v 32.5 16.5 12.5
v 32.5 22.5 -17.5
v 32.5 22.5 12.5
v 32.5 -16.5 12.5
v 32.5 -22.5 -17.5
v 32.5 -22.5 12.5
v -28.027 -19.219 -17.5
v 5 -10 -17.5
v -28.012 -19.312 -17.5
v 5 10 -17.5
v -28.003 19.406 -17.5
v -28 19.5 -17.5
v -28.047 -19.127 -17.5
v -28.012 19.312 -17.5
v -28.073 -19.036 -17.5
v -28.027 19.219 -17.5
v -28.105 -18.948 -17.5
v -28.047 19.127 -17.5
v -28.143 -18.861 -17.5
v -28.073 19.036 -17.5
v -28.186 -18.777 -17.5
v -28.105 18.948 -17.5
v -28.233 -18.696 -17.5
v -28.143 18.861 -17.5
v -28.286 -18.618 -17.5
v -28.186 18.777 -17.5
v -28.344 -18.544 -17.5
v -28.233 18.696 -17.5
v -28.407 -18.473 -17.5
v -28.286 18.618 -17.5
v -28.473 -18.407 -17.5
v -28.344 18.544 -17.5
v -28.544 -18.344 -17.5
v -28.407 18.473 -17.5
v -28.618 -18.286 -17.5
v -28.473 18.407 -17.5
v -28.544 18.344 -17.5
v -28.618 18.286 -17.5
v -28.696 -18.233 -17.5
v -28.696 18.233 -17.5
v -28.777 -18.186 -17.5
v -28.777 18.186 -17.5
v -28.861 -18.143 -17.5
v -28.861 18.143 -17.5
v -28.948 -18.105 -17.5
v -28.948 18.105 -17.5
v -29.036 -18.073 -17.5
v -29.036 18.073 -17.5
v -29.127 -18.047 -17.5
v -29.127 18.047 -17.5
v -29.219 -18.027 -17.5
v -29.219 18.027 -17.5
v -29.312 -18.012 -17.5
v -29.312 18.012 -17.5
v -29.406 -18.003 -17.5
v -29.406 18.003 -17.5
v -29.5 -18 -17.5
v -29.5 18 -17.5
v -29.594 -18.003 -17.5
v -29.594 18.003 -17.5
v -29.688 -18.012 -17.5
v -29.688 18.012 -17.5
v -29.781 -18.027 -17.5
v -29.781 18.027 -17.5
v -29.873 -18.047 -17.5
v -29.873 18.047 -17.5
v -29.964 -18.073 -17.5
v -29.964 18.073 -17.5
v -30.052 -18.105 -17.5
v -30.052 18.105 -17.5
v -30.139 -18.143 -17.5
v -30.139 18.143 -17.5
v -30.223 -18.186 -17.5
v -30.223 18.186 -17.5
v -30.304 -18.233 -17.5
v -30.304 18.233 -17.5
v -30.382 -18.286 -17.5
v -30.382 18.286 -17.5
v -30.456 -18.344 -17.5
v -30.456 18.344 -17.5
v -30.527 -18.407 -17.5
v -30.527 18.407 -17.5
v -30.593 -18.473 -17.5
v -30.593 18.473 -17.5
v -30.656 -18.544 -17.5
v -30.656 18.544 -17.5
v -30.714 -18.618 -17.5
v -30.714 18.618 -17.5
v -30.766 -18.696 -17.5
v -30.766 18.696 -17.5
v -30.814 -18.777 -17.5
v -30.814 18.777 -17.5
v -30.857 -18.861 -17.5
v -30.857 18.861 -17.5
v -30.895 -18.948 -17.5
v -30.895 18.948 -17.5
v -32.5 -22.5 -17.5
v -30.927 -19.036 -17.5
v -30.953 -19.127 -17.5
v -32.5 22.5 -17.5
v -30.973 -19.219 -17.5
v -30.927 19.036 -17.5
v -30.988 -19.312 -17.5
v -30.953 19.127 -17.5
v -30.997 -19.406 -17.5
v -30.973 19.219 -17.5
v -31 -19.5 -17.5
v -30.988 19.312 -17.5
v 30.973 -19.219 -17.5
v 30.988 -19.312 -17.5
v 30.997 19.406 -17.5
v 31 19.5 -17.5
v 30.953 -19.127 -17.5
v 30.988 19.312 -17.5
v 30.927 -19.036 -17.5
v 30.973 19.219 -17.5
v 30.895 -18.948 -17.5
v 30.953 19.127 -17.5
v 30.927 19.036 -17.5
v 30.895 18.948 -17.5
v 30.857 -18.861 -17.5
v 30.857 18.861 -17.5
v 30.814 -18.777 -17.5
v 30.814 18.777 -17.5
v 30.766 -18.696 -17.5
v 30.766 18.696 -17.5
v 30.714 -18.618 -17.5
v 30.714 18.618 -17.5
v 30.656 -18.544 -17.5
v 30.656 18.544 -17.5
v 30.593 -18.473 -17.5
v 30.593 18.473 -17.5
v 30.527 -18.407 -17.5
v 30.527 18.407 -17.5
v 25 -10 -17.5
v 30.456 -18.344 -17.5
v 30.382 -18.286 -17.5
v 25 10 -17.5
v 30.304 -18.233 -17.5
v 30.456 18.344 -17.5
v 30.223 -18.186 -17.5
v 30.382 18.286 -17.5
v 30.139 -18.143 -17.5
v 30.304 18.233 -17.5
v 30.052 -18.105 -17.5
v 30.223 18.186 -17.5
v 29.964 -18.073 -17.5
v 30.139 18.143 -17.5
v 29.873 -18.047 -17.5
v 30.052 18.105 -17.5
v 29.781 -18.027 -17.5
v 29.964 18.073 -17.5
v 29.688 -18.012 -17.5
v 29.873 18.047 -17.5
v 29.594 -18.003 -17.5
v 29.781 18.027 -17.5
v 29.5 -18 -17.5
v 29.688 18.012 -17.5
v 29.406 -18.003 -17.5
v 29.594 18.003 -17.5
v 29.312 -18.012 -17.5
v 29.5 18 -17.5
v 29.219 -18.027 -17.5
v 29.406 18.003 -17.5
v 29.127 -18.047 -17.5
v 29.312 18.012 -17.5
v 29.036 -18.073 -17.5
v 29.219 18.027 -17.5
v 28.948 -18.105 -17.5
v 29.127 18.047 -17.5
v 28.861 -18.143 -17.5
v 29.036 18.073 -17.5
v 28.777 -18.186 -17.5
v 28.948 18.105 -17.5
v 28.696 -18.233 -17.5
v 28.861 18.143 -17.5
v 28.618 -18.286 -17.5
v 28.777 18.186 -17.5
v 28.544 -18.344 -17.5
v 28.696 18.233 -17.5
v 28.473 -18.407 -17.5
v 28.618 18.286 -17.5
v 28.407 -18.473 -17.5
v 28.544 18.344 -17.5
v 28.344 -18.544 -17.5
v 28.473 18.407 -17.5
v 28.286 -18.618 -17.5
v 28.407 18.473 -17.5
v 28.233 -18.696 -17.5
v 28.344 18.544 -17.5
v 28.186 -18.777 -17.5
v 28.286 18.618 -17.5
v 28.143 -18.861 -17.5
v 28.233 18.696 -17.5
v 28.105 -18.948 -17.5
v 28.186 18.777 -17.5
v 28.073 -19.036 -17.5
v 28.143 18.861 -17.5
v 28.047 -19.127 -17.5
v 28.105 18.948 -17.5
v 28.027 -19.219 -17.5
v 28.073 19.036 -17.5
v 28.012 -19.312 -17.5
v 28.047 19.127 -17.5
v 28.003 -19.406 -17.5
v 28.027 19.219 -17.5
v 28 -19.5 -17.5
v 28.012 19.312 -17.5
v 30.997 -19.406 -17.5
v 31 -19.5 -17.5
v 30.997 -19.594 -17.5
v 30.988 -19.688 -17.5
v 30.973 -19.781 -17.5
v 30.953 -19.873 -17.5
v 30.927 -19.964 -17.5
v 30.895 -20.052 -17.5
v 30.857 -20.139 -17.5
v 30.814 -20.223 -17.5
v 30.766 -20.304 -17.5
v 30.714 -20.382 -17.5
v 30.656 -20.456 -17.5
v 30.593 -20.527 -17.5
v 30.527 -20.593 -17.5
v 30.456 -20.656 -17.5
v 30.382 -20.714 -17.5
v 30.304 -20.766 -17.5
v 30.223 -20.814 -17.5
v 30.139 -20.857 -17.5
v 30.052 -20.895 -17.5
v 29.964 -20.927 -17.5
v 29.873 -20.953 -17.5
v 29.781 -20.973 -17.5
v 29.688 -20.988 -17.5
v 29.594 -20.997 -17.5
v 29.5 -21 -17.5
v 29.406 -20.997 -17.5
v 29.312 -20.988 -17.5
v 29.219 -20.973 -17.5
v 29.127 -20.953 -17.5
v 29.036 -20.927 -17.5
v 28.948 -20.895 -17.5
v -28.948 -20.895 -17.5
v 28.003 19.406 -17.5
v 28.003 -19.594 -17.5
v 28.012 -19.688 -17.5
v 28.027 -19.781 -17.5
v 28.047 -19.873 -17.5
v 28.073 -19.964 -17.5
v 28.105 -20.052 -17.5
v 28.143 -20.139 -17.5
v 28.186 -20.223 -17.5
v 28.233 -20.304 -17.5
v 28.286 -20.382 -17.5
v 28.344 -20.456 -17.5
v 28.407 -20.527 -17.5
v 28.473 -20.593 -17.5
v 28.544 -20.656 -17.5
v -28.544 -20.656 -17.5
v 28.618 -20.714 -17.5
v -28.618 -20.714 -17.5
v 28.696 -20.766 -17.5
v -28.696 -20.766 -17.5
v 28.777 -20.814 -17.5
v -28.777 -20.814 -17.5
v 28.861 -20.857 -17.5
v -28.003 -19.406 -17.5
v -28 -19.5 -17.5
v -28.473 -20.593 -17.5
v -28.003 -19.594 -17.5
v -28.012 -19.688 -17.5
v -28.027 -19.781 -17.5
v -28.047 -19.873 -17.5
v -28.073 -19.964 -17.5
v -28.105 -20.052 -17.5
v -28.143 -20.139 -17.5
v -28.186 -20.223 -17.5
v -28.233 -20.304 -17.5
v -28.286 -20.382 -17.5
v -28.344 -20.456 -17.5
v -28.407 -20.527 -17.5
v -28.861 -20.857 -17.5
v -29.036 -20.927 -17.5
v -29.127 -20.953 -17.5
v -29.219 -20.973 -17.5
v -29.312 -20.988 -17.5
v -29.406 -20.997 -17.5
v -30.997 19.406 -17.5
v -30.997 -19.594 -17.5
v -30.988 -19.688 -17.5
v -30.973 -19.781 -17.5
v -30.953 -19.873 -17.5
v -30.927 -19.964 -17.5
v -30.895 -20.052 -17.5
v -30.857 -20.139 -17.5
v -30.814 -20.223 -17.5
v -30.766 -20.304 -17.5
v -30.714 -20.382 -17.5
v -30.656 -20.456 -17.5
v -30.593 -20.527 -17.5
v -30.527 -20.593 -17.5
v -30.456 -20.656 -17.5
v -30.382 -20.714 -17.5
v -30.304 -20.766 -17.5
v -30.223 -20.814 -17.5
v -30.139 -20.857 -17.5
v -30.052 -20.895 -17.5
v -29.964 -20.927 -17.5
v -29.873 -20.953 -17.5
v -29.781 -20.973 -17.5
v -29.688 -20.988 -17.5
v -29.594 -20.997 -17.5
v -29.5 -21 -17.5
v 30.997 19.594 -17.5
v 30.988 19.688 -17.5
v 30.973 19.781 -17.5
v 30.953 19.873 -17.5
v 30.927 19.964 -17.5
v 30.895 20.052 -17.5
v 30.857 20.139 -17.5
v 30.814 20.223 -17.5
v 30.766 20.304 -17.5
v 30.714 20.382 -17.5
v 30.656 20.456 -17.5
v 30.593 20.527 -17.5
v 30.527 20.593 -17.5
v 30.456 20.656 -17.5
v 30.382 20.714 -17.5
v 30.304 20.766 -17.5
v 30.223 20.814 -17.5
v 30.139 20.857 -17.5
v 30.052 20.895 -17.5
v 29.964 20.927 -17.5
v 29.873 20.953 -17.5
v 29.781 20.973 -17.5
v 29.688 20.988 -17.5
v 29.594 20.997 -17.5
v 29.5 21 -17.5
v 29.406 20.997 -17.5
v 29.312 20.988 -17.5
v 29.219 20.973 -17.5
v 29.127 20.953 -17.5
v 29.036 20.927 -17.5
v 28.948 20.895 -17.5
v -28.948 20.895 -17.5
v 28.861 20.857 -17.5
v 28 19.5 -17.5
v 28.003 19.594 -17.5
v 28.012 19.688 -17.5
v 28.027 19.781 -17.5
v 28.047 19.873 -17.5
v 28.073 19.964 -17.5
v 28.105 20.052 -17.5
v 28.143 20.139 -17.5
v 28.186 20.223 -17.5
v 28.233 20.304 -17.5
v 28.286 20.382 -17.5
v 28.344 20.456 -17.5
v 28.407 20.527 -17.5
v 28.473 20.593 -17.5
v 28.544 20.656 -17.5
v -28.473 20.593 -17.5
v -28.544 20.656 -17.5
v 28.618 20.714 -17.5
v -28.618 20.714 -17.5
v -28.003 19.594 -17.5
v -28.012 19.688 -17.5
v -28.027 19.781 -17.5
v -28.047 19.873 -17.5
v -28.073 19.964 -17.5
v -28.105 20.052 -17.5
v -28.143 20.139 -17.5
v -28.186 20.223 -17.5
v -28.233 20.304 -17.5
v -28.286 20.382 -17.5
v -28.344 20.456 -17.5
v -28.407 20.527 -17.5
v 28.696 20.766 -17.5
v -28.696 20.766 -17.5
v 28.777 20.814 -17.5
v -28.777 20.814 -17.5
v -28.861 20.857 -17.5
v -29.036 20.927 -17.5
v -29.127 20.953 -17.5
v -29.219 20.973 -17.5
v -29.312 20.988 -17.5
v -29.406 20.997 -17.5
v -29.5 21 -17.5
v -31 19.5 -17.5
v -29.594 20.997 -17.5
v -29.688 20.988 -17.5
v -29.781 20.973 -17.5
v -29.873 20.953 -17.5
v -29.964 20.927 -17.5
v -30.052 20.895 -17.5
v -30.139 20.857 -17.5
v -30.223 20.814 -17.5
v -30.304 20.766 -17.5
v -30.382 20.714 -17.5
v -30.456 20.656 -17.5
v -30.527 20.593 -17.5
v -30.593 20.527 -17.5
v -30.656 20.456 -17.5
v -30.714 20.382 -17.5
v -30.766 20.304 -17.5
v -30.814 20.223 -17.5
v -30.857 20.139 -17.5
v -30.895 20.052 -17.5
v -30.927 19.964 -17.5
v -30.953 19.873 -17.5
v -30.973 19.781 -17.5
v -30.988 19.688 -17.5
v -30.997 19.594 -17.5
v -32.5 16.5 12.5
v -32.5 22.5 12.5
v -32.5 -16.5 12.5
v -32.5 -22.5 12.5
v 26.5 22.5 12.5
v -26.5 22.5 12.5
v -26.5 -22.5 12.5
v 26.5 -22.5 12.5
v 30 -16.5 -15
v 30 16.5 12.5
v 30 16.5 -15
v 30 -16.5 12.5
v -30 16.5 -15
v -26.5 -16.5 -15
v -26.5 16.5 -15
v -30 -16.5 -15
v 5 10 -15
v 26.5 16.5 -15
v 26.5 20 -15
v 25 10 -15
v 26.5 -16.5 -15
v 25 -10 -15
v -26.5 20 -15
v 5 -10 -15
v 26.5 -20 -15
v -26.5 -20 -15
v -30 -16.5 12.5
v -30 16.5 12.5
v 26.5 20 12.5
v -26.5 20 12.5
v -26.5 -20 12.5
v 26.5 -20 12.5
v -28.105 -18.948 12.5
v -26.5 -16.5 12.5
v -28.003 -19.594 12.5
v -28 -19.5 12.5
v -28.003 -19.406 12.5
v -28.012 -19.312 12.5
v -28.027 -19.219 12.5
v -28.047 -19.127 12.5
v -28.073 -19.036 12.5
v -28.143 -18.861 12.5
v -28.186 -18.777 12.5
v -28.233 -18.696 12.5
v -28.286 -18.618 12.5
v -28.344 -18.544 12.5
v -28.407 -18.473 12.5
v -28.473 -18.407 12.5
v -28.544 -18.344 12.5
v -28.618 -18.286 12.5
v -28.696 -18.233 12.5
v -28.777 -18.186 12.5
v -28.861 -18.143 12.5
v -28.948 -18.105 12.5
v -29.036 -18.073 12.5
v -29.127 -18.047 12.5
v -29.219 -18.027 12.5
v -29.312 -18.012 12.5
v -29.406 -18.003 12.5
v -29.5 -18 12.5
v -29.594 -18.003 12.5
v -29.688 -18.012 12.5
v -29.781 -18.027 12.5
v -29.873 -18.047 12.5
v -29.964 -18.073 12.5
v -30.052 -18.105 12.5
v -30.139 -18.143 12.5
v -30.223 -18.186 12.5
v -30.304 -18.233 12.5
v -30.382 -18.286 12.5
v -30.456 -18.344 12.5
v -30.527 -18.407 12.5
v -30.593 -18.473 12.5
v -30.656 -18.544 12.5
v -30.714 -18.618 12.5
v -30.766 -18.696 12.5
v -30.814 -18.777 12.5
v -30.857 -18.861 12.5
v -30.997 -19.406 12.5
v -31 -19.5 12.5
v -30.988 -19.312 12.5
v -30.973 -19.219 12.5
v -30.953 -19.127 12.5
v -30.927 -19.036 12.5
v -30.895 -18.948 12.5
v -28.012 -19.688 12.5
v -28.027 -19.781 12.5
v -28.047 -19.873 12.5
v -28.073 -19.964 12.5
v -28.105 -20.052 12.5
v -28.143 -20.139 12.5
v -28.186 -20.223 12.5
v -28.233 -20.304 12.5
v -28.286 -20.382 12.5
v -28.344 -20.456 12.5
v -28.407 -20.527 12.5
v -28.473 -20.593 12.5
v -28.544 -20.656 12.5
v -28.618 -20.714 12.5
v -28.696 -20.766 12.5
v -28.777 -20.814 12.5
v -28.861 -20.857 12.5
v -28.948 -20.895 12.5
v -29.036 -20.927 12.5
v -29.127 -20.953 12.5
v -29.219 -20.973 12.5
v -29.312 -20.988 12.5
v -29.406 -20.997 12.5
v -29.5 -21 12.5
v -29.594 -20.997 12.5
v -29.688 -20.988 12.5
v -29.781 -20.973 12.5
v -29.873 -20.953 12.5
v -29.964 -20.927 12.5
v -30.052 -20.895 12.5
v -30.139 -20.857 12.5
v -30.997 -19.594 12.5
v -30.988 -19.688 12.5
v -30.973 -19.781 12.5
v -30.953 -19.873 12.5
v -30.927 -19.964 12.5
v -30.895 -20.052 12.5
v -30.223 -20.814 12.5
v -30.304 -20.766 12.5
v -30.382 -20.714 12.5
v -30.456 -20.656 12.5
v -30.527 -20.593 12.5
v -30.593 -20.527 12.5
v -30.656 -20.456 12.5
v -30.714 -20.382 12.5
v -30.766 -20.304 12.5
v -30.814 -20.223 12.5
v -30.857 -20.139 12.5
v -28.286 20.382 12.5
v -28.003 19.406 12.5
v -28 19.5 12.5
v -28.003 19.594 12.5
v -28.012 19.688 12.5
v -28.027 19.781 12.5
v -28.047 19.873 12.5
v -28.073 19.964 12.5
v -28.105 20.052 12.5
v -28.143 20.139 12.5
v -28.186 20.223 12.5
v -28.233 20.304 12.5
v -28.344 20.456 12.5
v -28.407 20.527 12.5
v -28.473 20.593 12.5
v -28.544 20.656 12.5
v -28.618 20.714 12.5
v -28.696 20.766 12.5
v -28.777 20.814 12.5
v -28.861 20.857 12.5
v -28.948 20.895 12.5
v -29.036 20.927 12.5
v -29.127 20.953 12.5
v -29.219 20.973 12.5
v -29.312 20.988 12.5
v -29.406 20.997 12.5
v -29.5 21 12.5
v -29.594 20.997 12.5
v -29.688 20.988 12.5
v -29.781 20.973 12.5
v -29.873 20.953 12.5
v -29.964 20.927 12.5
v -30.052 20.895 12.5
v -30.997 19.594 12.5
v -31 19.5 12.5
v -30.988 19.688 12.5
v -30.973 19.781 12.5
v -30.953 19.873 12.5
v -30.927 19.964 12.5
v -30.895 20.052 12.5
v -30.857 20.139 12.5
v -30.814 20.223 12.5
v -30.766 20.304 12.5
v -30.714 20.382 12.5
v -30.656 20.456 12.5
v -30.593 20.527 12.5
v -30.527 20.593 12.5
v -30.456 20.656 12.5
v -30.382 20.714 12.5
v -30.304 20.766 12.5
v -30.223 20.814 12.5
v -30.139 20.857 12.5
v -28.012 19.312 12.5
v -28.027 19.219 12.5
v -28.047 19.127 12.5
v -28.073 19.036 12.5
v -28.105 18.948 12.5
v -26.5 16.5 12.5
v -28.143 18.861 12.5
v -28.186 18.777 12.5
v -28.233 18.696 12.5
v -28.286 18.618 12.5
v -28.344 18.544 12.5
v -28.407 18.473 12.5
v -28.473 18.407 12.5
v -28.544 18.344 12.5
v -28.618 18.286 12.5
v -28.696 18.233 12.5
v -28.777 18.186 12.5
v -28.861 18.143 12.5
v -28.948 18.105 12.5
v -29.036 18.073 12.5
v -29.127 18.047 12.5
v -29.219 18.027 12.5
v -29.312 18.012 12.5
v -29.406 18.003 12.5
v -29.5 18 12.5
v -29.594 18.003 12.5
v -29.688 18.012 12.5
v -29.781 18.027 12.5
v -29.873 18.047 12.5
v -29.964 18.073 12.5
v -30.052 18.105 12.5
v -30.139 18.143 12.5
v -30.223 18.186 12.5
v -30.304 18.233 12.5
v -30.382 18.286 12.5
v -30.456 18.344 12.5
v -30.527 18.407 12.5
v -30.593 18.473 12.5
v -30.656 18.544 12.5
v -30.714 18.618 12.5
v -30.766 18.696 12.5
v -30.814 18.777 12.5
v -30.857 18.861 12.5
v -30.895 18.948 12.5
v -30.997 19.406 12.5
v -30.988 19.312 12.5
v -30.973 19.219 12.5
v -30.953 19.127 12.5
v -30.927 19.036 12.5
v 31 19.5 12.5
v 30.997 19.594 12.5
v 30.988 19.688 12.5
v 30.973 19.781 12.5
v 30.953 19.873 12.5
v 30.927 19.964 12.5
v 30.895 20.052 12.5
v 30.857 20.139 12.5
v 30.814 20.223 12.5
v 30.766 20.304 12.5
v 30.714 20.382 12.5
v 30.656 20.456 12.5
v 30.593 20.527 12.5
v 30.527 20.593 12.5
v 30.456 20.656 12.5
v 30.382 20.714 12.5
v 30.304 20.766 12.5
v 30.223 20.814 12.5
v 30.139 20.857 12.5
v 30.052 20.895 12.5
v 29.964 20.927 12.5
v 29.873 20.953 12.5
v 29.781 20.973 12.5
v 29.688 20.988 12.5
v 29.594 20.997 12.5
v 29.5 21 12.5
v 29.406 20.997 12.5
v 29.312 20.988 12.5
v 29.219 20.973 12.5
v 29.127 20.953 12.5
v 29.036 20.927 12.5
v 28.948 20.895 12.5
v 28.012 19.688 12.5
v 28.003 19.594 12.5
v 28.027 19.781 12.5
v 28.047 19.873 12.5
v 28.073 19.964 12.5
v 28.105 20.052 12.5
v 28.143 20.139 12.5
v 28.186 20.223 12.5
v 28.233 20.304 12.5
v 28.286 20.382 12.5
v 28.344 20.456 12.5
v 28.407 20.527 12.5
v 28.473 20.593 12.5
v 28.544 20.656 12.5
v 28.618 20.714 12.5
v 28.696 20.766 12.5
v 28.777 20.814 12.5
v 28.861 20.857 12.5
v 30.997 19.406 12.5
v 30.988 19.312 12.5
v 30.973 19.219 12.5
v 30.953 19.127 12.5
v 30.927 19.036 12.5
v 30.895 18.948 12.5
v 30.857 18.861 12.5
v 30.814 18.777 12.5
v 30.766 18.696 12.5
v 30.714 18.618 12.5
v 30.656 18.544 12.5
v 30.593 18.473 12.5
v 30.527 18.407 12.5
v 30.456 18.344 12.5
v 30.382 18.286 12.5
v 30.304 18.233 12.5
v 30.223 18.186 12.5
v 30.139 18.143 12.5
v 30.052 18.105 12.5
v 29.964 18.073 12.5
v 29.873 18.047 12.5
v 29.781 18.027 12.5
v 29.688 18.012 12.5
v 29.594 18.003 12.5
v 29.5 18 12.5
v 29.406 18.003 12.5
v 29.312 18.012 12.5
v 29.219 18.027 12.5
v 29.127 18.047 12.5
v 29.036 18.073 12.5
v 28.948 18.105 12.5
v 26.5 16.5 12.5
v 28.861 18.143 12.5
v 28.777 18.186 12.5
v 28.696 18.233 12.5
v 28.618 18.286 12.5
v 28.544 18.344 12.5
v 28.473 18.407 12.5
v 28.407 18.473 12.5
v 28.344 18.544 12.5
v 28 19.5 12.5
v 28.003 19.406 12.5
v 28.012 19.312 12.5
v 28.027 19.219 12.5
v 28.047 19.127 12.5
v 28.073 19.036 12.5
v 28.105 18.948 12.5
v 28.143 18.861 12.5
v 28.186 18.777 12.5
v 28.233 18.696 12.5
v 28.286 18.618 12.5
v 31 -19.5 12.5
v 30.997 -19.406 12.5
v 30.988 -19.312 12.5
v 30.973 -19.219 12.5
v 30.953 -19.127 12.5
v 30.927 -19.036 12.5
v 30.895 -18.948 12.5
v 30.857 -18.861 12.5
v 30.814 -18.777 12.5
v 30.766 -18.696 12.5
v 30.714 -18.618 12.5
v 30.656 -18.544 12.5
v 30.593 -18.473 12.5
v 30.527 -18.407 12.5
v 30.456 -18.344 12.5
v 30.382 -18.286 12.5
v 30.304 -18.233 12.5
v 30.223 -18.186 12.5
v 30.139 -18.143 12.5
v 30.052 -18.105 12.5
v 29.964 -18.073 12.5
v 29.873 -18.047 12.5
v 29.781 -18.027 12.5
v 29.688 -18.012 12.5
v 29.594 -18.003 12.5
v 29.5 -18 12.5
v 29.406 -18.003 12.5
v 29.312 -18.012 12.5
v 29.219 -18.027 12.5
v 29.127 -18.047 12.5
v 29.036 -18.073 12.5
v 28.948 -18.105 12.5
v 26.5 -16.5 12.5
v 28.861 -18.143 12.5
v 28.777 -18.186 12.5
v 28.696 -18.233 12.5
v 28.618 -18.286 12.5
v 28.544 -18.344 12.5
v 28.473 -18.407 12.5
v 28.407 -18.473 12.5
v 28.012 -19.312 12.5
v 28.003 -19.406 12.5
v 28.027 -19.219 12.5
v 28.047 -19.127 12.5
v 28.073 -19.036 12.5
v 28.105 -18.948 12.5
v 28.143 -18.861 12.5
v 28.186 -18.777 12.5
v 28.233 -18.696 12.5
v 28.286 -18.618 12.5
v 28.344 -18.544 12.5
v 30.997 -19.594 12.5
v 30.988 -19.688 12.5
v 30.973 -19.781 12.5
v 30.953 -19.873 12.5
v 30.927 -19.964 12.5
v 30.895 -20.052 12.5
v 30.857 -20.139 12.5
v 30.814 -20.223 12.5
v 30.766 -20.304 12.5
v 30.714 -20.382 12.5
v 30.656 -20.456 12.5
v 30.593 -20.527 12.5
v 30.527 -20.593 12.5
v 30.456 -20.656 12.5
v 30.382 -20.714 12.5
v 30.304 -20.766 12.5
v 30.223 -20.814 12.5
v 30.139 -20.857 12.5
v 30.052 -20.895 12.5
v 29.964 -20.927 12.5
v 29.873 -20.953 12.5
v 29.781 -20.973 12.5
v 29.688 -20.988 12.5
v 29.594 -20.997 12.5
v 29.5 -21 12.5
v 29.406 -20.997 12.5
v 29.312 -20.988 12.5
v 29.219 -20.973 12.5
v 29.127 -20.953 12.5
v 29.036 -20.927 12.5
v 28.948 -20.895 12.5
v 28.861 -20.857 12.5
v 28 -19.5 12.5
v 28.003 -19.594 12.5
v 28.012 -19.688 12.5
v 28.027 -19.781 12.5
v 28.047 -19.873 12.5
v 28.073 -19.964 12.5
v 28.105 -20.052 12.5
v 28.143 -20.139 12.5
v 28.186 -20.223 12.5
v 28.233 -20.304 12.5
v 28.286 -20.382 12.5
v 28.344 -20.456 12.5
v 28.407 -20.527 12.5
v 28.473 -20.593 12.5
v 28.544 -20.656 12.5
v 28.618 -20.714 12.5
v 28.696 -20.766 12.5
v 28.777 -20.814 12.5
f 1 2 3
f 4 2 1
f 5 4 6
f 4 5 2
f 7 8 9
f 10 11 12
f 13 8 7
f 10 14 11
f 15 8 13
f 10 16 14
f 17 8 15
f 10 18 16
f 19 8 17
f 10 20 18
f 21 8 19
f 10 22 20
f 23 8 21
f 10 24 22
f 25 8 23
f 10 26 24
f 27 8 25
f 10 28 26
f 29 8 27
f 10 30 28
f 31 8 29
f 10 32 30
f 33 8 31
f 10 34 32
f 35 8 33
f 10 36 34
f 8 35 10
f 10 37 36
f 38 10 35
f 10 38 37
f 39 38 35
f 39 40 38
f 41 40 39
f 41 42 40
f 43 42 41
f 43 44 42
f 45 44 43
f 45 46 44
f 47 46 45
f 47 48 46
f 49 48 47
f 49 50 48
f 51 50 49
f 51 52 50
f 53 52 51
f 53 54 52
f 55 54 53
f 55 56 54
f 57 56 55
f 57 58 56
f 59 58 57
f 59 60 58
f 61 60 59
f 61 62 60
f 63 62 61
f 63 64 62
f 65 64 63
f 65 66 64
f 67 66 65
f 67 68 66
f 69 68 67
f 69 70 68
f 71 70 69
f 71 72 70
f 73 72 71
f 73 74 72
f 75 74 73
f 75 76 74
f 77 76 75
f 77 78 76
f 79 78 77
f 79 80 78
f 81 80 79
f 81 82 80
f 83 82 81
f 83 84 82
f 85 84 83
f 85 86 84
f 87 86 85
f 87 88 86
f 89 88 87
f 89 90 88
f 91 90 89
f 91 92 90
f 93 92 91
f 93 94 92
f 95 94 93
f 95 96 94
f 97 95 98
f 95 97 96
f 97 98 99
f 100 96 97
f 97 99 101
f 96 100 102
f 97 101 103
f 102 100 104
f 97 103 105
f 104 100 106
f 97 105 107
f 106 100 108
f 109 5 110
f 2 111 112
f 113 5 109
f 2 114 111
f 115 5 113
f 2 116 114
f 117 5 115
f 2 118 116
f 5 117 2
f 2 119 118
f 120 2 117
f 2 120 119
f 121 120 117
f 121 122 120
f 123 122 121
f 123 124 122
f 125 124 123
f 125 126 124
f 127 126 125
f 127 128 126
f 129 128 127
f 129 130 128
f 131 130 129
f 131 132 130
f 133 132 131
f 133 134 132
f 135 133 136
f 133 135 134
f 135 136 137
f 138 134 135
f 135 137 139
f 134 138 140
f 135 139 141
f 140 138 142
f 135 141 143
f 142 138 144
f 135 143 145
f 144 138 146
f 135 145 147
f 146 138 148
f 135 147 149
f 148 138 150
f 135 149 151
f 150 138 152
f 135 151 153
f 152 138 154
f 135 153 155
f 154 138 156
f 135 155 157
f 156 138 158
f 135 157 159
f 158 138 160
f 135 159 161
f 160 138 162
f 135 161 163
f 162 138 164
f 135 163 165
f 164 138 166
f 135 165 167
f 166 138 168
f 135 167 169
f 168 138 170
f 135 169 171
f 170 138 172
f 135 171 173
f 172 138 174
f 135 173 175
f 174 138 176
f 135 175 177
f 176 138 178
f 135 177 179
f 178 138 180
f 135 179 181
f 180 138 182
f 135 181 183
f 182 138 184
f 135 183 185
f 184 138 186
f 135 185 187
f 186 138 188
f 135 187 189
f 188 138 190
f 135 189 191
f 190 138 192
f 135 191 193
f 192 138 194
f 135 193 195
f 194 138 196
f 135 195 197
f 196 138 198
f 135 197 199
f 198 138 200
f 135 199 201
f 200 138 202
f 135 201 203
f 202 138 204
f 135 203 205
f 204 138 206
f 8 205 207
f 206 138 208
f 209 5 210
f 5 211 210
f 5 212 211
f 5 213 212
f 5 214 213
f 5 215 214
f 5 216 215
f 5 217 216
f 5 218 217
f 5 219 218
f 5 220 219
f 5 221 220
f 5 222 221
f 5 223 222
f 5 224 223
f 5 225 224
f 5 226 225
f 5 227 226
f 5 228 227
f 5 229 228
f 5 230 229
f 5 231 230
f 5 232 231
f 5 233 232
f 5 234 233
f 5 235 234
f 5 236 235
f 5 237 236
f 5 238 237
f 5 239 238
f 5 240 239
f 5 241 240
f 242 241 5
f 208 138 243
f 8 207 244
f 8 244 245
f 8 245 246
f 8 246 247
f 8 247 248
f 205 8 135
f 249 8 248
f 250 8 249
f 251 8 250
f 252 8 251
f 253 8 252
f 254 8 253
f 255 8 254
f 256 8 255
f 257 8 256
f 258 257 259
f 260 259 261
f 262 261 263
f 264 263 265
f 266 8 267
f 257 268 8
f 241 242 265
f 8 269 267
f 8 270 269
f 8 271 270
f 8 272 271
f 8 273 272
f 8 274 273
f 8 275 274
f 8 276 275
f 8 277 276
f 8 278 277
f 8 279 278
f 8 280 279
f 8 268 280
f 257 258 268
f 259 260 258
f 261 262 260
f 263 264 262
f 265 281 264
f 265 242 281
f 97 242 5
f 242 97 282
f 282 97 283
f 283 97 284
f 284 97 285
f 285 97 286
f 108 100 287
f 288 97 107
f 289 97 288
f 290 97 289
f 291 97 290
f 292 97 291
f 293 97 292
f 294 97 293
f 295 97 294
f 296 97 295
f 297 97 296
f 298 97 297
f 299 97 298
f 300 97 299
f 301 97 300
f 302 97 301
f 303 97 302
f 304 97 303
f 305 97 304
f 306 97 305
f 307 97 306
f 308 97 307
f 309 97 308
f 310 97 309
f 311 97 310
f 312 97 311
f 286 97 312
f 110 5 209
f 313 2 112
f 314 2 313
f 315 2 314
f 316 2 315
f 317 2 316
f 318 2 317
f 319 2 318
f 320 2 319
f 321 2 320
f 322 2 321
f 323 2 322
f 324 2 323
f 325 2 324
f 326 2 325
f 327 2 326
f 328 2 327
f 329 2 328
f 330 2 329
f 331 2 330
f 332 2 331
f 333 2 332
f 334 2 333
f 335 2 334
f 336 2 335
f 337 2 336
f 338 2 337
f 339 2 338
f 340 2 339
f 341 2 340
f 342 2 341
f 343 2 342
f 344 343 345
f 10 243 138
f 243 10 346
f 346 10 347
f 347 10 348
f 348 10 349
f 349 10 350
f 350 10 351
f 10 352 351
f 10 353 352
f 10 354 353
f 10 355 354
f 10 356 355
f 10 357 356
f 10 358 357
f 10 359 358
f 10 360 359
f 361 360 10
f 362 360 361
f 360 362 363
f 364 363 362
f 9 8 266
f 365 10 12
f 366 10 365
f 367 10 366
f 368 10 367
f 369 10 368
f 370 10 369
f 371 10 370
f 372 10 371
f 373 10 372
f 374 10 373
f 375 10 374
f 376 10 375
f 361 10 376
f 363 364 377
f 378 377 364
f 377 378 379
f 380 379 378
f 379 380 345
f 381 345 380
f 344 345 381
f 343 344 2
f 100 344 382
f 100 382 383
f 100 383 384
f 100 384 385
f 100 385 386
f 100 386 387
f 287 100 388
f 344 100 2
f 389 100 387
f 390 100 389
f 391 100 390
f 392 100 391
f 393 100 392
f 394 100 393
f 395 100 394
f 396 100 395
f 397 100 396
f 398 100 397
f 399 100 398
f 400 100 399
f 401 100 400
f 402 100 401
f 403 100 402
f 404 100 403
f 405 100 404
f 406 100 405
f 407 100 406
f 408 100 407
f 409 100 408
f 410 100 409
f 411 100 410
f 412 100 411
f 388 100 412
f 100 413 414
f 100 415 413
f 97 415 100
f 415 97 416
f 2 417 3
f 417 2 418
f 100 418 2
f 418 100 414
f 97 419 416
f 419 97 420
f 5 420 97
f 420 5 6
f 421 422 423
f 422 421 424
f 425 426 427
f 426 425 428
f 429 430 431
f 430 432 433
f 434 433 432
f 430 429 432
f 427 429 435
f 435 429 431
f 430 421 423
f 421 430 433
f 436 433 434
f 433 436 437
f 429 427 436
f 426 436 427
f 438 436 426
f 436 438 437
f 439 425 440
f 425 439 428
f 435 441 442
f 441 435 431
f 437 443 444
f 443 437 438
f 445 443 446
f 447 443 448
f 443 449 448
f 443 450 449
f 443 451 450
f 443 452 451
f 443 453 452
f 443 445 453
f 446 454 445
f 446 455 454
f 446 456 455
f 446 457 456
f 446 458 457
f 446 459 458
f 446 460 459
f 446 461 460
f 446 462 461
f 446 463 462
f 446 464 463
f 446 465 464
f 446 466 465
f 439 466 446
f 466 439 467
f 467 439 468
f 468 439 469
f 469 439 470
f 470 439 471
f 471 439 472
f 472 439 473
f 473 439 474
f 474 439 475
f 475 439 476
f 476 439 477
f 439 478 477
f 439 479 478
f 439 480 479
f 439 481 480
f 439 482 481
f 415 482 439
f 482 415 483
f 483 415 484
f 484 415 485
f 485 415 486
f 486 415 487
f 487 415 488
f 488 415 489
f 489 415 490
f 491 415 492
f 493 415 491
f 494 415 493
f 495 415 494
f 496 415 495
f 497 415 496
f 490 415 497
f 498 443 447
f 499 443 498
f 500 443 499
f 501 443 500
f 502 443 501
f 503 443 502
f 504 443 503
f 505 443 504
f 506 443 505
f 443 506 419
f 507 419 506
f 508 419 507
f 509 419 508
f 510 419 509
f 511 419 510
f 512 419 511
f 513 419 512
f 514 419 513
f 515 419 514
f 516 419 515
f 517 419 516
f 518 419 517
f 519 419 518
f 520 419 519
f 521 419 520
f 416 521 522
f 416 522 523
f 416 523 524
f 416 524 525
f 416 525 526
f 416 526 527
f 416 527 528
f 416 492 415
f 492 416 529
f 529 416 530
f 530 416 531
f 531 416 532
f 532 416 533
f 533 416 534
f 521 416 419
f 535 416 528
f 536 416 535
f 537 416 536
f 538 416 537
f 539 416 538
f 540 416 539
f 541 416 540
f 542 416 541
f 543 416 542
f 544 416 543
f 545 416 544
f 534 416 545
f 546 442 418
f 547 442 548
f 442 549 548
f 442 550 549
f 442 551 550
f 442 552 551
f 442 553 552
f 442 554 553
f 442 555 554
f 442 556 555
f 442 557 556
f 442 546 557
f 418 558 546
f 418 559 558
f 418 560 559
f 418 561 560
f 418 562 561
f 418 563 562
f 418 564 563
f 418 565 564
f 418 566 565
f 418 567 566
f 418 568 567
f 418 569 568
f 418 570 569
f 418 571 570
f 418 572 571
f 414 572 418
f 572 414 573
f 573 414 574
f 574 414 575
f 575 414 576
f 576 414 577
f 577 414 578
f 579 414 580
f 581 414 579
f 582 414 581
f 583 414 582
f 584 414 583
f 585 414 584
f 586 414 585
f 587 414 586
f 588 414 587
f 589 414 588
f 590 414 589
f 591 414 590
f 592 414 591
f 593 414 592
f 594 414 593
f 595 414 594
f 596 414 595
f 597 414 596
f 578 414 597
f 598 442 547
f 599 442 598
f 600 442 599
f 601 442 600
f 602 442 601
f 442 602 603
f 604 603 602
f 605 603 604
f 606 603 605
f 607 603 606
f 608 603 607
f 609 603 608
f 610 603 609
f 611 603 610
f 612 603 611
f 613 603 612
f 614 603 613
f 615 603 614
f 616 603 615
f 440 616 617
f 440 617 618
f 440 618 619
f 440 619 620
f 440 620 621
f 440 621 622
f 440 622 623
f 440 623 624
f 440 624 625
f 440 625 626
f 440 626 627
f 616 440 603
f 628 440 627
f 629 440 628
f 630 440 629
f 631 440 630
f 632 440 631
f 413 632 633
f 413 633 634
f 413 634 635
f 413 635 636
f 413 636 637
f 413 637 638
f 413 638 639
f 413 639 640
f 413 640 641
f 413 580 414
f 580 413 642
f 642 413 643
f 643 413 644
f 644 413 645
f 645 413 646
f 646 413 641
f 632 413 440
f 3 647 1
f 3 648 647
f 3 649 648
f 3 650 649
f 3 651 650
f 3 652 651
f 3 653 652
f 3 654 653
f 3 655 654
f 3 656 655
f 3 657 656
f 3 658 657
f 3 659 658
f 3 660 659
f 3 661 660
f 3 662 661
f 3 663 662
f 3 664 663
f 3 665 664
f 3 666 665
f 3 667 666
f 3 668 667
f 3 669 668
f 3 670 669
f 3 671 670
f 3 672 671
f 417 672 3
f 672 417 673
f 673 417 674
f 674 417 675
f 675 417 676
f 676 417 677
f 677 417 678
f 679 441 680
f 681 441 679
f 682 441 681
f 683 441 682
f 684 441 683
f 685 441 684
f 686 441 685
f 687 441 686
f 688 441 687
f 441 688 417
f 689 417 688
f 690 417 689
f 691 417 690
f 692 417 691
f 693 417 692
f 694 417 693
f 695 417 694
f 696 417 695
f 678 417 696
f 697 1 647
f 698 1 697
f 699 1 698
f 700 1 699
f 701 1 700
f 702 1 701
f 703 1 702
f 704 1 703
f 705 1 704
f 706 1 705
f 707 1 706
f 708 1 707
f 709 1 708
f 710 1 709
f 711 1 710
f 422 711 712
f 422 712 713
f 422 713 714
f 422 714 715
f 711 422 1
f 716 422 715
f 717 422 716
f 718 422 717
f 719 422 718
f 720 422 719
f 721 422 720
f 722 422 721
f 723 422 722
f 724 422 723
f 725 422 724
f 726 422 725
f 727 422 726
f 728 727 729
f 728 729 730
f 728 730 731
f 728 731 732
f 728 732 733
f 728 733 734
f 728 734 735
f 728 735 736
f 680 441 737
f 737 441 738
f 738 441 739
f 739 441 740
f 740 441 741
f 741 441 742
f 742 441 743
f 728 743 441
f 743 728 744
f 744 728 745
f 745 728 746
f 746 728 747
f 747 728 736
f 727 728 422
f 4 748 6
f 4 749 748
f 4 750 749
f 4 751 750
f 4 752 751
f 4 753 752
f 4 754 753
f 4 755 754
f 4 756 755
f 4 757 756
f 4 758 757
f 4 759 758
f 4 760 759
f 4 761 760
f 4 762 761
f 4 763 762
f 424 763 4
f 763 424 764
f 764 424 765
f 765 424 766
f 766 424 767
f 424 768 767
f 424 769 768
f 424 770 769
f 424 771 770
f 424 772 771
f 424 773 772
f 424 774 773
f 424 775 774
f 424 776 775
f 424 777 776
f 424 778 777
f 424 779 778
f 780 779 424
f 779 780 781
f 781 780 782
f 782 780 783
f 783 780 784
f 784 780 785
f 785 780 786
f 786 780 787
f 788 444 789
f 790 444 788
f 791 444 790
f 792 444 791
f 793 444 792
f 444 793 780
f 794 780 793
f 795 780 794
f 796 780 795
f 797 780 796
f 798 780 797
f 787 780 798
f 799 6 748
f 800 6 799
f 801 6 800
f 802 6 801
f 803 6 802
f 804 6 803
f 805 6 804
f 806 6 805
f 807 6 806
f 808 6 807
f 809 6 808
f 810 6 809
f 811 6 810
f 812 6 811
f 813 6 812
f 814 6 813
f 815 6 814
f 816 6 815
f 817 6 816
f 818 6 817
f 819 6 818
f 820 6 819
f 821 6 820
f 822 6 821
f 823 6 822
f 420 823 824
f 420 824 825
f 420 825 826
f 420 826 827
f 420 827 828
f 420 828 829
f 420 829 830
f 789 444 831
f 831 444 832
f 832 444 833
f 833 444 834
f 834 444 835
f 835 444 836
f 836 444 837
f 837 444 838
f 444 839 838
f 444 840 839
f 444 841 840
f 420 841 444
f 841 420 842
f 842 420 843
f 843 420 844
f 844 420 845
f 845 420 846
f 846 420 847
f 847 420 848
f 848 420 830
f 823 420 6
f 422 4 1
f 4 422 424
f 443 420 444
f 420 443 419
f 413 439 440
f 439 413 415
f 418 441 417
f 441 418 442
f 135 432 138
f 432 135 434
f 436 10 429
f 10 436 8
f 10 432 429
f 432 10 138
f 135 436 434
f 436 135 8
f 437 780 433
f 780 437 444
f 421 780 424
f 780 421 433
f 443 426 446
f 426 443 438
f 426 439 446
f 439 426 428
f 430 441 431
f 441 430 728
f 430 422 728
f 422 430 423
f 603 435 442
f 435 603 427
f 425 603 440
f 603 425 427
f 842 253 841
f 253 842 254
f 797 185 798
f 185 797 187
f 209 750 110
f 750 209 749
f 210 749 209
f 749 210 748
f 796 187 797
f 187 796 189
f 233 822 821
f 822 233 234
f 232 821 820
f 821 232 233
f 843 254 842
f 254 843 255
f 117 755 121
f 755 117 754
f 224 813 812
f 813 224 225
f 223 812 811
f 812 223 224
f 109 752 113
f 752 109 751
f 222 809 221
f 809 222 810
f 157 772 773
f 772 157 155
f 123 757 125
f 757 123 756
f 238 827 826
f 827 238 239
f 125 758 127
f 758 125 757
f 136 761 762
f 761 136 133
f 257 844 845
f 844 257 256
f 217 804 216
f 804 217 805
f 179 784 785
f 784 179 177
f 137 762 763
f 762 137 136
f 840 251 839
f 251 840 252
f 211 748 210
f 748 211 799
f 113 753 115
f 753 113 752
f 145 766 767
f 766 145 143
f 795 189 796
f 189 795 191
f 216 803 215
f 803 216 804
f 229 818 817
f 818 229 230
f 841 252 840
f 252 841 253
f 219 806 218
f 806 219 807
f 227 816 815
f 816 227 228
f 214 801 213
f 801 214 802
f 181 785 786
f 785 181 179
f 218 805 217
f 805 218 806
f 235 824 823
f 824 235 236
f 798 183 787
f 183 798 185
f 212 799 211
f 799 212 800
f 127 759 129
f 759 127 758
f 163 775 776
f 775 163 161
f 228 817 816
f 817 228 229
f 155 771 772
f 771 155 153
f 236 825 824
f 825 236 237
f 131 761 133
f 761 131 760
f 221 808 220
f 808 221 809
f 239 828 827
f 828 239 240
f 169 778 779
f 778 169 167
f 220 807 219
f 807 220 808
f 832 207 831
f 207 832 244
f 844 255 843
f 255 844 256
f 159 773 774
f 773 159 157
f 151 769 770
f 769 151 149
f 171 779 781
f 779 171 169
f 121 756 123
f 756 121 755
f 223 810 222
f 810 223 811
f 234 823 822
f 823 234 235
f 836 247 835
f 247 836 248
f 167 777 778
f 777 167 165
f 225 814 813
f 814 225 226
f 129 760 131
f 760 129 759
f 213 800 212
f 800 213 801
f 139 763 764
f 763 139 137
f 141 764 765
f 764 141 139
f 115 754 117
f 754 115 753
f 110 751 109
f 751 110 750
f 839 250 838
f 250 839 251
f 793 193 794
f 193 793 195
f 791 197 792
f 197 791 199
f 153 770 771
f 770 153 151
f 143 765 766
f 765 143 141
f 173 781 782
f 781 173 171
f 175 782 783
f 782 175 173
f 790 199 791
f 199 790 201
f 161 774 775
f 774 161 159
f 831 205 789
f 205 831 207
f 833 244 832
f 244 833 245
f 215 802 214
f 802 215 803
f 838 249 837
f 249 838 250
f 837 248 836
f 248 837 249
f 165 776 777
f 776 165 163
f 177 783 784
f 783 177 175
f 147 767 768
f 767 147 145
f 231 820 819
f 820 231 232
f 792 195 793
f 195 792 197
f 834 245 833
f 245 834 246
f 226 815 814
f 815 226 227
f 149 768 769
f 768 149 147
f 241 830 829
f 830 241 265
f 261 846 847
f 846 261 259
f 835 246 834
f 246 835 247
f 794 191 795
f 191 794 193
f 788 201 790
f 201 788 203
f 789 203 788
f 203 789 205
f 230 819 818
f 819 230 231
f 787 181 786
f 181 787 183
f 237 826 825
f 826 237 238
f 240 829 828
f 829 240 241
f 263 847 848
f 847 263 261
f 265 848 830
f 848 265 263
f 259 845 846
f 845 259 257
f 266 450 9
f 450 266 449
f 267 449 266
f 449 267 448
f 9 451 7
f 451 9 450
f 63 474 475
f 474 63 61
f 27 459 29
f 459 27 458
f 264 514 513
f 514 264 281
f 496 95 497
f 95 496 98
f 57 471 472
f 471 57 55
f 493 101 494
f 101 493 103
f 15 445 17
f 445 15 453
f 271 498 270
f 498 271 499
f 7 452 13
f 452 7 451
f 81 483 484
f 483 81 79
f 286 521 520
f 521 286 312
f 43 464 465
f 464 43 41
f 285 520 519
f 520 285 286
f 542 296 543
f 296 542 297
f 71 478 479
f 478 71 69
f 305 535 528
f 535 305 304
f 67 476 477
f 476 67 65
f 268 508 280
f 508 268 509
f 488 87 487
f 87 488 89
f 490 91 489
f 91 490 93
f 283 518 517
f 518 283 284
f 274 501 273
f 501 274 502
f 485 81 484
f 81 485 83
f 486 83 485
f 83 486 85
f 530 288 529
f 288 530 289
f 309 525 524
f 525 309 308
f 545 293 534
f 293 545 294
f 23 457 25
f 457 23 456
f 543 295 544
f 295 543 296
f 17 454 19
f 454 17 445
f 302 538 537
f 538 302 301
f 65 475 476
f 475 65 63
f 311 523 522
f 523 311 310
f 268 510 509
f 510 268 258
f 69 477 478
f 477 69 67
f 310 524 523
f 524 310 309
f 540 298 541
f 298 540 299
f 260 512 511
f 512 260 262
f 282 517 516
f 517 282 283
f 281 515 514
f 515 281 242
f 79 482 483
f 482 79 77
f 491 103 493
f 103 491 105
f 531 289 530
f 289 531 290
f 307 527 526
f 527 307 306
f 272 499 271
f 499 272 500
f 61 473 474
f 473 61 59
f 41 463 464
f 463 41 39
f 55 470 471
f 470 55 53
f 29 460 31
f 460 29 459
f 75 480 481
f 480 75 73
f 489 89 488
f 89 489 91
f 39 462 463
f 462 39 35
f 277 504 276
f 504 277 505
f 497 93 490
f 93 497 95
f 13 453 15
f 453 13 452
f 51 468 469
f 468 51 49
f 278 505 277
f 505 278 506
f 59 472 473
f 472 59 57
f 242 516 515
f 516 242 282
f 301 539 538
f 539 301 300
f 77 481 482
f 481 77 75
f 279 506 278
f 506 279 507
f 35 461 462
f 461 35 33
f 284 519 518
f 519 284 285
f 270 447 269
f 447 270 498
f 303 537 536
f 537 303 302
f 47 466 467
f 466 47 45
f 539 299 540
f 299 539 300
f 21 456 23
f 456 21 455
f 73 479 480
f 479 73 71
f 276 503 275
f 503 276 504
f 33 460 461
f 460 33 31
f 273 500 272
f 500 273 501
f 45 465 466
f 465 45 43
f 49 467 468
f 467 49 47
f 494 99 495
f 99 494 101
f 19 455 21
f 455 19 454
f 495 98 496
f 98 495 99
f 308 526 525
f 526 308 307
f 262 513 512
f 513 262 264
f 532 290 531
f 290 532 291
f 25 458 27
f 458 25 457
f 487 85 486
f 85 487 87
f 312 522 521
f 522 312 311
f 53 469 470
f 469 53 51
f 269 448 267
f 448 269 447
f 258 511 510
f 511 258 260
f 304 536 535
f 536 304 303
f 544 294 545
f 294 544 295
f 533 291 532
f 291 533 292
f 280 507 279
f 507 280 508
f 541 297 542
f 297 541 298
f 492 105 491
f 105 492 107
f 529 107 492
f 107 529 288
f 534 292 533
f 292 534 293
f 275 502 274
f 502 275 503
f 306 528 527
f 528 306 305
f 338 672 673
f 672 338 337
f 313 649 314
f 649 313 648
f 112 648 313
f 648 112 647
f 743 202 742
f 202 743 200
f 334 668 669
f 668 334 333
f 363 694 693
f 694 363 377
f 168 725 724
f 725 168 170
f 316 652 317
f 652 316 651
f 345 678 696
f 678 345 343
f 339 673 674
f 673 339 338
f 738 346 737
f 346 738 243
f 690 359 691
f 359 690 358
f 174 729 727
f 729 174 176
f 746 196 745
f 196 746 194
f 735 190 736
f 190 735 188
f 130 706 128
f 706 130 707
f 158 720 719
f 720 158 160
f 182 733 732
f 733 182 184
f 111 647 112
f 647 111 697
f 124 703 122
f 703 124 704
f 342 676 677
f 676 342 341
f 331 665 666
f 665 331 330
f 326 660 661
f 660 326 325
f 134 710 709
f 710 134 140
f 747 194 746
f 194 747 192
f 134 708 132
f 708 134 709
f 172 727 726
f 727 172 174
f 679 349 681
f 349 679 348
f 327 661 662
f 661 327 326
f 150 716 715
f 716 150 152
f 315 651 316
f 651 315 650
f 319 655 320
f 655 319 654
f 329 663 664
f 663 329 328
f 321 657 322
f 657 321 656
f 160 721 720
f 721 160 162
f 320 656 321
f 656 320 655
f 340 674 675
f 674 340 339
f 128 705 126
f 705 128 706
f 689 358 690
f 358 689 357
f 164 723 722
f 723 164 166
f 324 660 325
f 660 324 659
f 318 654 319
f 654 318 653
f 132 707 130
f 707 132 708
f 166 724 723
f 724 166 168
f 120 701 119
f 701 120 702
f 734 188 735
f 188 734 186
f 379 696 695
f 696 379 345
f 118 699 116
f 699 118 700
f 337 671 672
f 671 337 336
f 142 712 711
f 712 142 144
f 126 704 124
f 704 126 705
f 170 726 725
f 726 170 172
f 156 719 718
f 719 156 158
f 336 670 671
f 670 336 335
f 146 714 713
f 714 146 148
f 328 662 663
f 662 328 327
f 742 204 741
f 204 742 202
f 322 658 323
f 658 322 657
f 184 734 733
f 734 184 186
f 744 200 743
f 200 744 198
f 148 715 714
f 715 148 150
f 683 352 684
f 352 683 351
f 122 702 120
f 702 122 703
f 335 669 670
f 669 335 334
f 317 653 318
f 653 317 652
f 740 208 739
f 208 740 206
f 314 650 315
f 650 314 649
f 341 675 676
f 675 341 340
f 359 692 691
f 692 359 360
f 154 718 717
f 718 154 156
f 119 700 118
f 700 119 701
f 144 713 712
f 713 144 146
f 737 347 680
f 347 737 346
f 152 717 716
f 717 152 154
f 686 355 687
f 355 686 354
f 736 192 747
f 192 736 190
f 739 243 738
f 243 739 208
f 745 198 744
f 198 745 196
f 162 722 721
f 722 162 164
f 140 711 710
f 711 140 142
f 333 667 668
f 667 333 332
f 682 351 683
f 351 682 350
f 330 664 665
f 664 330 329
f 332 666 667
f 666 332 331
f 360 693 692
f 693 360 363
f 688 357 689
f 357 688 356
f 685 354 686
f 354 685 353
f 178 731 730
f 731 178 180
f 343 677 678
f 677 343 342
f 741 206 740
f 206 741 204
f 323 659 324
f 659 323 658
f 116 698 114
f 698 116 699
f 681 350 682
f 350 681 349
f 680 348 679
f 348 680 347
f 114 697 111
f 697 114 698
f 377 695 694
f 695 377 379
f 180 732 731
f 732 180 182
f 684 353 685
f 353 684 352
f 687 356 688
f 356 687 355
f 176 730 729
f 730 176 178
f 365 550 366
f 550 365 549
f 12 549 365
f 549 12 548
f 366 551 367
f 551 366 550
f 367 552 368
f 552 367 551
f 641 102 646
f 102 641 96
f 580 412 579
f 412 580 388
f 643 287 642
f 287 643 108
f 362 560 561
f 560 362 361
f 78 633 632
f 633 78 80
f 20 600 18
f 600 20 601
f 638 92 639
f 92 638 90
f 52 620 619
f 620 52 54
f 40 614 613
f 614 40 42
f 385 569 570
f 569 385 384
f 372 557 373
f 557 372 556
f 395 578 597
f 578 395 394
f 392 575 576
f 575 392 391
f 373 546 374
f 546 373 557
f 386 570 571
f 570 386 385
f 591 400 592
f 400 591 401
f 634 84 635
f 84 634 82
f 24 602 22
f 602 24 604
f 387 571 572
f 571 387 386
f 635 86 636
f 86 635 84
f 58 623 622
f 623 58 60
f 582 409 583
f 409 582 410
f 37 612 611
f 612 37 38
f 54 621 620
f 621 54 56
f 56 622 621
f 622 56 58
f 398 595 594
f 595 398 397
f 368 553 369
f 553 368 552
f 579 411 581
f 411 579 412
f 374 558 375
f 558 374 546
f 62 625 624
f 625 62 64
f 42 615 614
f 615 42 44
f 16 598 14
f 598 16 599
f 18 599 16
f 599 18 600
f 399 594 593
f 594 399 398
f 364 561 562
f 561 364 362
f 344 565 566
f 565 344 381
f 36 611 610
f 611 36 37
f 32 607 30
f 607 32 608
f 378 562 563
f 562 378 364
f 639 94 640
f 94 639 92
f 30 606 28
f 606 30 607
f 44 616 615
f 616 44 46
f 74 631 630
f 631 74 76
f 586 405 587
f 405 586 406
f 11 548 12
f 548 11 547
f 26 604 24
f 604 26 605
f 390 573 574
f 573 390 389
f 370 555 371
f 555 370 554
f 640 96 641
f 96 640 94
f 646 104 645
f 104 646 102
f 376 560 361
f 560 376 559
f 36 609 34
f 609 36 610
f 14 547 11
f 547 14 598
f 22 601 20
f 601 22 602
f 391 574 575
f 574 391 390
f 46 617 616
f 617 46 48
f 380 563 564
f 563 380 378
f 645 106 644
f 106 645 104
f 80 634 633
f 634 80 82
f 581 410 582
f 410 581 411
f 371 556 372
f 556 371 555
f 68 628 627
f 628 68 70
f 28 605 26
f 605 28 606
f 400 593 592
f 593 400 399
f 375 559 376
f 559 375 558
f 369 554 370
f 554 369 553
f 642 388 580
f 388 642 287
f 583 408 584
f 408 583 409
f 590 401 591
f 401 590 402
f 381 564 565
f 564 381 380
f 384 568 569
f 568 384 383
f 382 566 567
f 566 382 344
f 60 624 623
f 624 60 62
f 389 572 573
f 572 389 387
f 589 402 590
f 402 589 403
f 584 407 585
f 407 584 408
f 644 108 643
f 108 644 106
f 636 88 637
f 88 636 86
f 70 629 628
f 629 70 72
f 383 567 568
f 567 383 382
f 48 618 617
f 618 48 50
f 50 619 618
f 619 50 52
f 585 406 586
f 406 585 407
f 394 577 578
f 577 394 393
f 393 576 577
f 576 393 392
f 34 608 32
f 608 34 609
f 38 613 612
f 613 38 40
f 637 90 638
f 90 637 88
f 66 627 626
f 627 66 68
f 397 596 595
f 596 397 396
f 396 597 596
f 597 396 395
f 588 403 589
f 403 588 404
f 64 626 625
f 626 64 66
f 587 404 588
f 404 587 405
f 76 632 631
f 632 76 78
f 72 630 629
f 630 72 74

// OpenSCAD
scale([10,10,10]){
    
    //TUBE ORIGINE
    if(false){
        translate([0,0,2])
        difference(){
            cylinder(h=1.5,d=1.5,center=false,$fn=100);
            cylinder(h=20,d=1.2,center=true,$fn=100);
        }

        difference(){
            cylinder(h=2,d=1.5,$fn=100);
            cylinder(h=20,d=0.5,$fn=100);
            cylinder(h=1.8*2,d=1,center=true,$fn=100);
        }
    }
    //TUBE 2.0
    if(false){
        translate([0,0,3])
        difference(){
            union(){
                translate([0,0,2])
                difference(){
                    cylinder(h=1.5,d=1.5,center=false,$fn=100);
                    cylinder(h=20,d=1.2,center=true,$fn=100);
                }

                difference(){
                    cylinder(h=2,d=1.5,$fn=100);
                    cylinder(h=20,d=0.5,$fn=100);
                    cylinder(h=1.8*2,d=1,center=true,$fn=100);
                }
                translate([0,0,1.2])
                difference(){
                    cylinder(h=2.5,d=2,$fn=100);
                    translate([0,0,-1])
                    cylinder(h=5,d=1.5,$fn=100);
                }
            }
            rotate_extrude($fn=200)
            polygon( points=[[0.73,0],[0.75,1.1],[15,1],[15,0]]);
        }
    }
    //CARRE POUR PTFE
    if(false){
        translate([0,0,10])
        difference(){
            union(){
                difference(){
                    translate([0,0,-0.25])
                    cube([2,2,2.5],center=true);
                    cube([1.7,1.7,5],center=true);
                }
                translate([0,0,0.1])
                difference(){
                    cube([2.3,2.3,2.1],center=true);
                    cube([2,2,5],center=true);                
                }
                cube([2,2,0.5],center=true);
                
            }
            ////////////////
            union(){
                cylinder(h=20,d=0.52,$fn=100,center=true);
                translate([0,0,-10])
                cylinder(h=20,d=0.7,$fn=100,center=true);
            }
            translate([0.5,0.5,0])
            union(){
                cylinder(h=20,d=0.52,$fn=100,center=true);
                translate([0,0,-10])
                cylinder(h=20,d=0.7,$fn=100,center=true);
            }
            translate([-0.5,0.5,0])
            union(){
                cylinder(h=20,d=0.52,$fn=100,center=true);
                translate([0,0,-10])
                cylinder(h=20,d=0.7,$fn=100,center=true);
            }
            translate([0.5,-0.5,0])
            union(){
                cylinder(h=20,d=0.52,$fn=100,center=true);
                translate([0,0,-10])
                cylinder(h=20,d=0.7,$fn=100,center=true);
            }
            translate([-0.5,-0.5,0])
            union(){
                cylinder(h=20,d=0.52,$fn=100,center=true);
                translate([0,0,-10])
                cylinder(h=20,d=0.7,$fn=100,center=true);
            }
            ///////////////////
            translate([-1.01,0,-0.98])
            rotate([270,0,0])
            linear_extrude(height=10,center=true)
            polygon( points=[[0,0],[0,0.6],[0.1,0.6]]);
            
            translate([1.01,0,-0.98])
            rotate([270,0,180])
            linear_extrude(height=10,center=true)
            polygon( points=[[0,0],[0,0.6],[0.1,0.6]]);
            
            translate([0,-1.01,-0.98])
            rotate([270,0,90])
            linear_extrude(height=10,center=true)
            polygon( points=[[0,0],[0,0.6],[0.1,0.6]]);
            
            translate([0,1.01,-0.98])
            rotate([270,0,-90])
            linear_extrude(height=10,center=true)
            polygon( points=[[0,0],[0,0.6],[0.1,0.6]]);

            ///////////////////
            translate([-1.3,0,-0.66])
            rotate([270,0,0])
            linear_extrude(height=10,center=true)
            polygon( points=[[0,0],[0,0.3],[0.3,0.3]]);
            
            translate([1.3,0,-0.66])
            rotate([270,0,180])
            linear_extrude(height=10,center=true)
            polygon( points=[[0,0],[0,0.3],[0.3,0.3]]);
            
            translate([0,-1.3,-0.66])
            rotate([270,0,90])
            linear_extrude(height=10,center=true)
            polygon( points=[[0,0],[0,0.3],[0.3,0.3]]);
            
            translate([0,1.3,-0.66])
            rotate([270,0,-90])
            linear_extrude(height=10,center=true)
            polygon( points=[[0,0],[0,0.3],[0.3,0.3]]);
        }

    }
    //BOX
    if(true){
        difference(){
            union(){
                difference(){
                    cube([6.5,4.5,3.5],center=true);
                    cube([6,4,3],center=true);
                    translate([0,0,3.5/2])
                    cube([7,5,1],center=true);
                    translate([1.5,0,-2])
                    cube([2,2,10],center=true);
                    //cylinder(h=1.5,d=1.5,center=false,$fn=100);
                }
                translate([3.25-0.3,-2.25+0.3,-0.25])
                cube([0.6,0.6,3],center=true);
                translate([-3.25+0.3,-2.25+0.3,-0.25])
                cube([0.6,0.6,3],center=true);
                translate([3.25-0.3,2.25-0.3,-0.25])
                cube([0.6,0.6,3],center=true);
                translate([-3.25+0.3,+2.25-0.3,-0.25])
                cube([0.6,0.6,3],center=true);
            }
            translate([3.25-0.3,-2.25+0.3,-0.25])
            cylinder(h=20,d=0.3,center=true,$fn=100);
            translate([-3.25+0.3,-2.25+0.3,-0.25])
            cylinder(h=20,d=0.3,center=true,$fn=100);
            translate([3.25-0.3,2.25-0.3,-0.25])
            cylinder(h=20,d=0.3,center=true,$fn=100);
            translate([-3.25+0.3,+2.25-0.3,-0.25])
            cylinder(h=20,d=0.3,center=true,$fn=100);
        }
    }
    //COUVERCLE
    if(false){
        translate([-7,0,3])
        difference(){
            union(){
                difference(){
                    cube([6.5,4.5,3.5],center=true);
                    cube([6,4,3],center=true);
                    translate([0,0,3.5/2])
                    cube([7,5,1],center=true);
                }
                translate([3.25-0.3,-2.25+0.3,-0.25])
                cube([0.6,0.6,3],center=true);
                translate([-3.25+0.3,-2.25+0.3,-0.25])
                cube([0.6,0.6,3],center=true);
                translate([3.25-0.3,2.25-0.3,-0.25])
                cube([0.6,0.6,3],center=true);
                translate([-3.25+0.3,+2.25-0.3,-0.25])
                cube([0.6,0.6,3],center=true);
            }
            translate([3.25-0.3,-2.25+0.3,-0.25])
            cylinder(h=20,d=0.3,center=true,$fn=100);
            translate([-3.25+0.3,-2.25+0.3,-0.25])
            cylinder(h=20,d=0.3,center=true,$fn=100);
            translate([3.25-0.3,2.25-0.3,-0.25])
            cylinder(h=20,d=0.3,center=true,$fn=100);
            translate([-3.25+0.3,+2.25-0.3,-0.25])
            cylinder(h=20,d=0.3,center=true,$fn=100);
            
            translate([0,0,0.5])
            cube([7,5,3],center=true);
        }
    }
}
